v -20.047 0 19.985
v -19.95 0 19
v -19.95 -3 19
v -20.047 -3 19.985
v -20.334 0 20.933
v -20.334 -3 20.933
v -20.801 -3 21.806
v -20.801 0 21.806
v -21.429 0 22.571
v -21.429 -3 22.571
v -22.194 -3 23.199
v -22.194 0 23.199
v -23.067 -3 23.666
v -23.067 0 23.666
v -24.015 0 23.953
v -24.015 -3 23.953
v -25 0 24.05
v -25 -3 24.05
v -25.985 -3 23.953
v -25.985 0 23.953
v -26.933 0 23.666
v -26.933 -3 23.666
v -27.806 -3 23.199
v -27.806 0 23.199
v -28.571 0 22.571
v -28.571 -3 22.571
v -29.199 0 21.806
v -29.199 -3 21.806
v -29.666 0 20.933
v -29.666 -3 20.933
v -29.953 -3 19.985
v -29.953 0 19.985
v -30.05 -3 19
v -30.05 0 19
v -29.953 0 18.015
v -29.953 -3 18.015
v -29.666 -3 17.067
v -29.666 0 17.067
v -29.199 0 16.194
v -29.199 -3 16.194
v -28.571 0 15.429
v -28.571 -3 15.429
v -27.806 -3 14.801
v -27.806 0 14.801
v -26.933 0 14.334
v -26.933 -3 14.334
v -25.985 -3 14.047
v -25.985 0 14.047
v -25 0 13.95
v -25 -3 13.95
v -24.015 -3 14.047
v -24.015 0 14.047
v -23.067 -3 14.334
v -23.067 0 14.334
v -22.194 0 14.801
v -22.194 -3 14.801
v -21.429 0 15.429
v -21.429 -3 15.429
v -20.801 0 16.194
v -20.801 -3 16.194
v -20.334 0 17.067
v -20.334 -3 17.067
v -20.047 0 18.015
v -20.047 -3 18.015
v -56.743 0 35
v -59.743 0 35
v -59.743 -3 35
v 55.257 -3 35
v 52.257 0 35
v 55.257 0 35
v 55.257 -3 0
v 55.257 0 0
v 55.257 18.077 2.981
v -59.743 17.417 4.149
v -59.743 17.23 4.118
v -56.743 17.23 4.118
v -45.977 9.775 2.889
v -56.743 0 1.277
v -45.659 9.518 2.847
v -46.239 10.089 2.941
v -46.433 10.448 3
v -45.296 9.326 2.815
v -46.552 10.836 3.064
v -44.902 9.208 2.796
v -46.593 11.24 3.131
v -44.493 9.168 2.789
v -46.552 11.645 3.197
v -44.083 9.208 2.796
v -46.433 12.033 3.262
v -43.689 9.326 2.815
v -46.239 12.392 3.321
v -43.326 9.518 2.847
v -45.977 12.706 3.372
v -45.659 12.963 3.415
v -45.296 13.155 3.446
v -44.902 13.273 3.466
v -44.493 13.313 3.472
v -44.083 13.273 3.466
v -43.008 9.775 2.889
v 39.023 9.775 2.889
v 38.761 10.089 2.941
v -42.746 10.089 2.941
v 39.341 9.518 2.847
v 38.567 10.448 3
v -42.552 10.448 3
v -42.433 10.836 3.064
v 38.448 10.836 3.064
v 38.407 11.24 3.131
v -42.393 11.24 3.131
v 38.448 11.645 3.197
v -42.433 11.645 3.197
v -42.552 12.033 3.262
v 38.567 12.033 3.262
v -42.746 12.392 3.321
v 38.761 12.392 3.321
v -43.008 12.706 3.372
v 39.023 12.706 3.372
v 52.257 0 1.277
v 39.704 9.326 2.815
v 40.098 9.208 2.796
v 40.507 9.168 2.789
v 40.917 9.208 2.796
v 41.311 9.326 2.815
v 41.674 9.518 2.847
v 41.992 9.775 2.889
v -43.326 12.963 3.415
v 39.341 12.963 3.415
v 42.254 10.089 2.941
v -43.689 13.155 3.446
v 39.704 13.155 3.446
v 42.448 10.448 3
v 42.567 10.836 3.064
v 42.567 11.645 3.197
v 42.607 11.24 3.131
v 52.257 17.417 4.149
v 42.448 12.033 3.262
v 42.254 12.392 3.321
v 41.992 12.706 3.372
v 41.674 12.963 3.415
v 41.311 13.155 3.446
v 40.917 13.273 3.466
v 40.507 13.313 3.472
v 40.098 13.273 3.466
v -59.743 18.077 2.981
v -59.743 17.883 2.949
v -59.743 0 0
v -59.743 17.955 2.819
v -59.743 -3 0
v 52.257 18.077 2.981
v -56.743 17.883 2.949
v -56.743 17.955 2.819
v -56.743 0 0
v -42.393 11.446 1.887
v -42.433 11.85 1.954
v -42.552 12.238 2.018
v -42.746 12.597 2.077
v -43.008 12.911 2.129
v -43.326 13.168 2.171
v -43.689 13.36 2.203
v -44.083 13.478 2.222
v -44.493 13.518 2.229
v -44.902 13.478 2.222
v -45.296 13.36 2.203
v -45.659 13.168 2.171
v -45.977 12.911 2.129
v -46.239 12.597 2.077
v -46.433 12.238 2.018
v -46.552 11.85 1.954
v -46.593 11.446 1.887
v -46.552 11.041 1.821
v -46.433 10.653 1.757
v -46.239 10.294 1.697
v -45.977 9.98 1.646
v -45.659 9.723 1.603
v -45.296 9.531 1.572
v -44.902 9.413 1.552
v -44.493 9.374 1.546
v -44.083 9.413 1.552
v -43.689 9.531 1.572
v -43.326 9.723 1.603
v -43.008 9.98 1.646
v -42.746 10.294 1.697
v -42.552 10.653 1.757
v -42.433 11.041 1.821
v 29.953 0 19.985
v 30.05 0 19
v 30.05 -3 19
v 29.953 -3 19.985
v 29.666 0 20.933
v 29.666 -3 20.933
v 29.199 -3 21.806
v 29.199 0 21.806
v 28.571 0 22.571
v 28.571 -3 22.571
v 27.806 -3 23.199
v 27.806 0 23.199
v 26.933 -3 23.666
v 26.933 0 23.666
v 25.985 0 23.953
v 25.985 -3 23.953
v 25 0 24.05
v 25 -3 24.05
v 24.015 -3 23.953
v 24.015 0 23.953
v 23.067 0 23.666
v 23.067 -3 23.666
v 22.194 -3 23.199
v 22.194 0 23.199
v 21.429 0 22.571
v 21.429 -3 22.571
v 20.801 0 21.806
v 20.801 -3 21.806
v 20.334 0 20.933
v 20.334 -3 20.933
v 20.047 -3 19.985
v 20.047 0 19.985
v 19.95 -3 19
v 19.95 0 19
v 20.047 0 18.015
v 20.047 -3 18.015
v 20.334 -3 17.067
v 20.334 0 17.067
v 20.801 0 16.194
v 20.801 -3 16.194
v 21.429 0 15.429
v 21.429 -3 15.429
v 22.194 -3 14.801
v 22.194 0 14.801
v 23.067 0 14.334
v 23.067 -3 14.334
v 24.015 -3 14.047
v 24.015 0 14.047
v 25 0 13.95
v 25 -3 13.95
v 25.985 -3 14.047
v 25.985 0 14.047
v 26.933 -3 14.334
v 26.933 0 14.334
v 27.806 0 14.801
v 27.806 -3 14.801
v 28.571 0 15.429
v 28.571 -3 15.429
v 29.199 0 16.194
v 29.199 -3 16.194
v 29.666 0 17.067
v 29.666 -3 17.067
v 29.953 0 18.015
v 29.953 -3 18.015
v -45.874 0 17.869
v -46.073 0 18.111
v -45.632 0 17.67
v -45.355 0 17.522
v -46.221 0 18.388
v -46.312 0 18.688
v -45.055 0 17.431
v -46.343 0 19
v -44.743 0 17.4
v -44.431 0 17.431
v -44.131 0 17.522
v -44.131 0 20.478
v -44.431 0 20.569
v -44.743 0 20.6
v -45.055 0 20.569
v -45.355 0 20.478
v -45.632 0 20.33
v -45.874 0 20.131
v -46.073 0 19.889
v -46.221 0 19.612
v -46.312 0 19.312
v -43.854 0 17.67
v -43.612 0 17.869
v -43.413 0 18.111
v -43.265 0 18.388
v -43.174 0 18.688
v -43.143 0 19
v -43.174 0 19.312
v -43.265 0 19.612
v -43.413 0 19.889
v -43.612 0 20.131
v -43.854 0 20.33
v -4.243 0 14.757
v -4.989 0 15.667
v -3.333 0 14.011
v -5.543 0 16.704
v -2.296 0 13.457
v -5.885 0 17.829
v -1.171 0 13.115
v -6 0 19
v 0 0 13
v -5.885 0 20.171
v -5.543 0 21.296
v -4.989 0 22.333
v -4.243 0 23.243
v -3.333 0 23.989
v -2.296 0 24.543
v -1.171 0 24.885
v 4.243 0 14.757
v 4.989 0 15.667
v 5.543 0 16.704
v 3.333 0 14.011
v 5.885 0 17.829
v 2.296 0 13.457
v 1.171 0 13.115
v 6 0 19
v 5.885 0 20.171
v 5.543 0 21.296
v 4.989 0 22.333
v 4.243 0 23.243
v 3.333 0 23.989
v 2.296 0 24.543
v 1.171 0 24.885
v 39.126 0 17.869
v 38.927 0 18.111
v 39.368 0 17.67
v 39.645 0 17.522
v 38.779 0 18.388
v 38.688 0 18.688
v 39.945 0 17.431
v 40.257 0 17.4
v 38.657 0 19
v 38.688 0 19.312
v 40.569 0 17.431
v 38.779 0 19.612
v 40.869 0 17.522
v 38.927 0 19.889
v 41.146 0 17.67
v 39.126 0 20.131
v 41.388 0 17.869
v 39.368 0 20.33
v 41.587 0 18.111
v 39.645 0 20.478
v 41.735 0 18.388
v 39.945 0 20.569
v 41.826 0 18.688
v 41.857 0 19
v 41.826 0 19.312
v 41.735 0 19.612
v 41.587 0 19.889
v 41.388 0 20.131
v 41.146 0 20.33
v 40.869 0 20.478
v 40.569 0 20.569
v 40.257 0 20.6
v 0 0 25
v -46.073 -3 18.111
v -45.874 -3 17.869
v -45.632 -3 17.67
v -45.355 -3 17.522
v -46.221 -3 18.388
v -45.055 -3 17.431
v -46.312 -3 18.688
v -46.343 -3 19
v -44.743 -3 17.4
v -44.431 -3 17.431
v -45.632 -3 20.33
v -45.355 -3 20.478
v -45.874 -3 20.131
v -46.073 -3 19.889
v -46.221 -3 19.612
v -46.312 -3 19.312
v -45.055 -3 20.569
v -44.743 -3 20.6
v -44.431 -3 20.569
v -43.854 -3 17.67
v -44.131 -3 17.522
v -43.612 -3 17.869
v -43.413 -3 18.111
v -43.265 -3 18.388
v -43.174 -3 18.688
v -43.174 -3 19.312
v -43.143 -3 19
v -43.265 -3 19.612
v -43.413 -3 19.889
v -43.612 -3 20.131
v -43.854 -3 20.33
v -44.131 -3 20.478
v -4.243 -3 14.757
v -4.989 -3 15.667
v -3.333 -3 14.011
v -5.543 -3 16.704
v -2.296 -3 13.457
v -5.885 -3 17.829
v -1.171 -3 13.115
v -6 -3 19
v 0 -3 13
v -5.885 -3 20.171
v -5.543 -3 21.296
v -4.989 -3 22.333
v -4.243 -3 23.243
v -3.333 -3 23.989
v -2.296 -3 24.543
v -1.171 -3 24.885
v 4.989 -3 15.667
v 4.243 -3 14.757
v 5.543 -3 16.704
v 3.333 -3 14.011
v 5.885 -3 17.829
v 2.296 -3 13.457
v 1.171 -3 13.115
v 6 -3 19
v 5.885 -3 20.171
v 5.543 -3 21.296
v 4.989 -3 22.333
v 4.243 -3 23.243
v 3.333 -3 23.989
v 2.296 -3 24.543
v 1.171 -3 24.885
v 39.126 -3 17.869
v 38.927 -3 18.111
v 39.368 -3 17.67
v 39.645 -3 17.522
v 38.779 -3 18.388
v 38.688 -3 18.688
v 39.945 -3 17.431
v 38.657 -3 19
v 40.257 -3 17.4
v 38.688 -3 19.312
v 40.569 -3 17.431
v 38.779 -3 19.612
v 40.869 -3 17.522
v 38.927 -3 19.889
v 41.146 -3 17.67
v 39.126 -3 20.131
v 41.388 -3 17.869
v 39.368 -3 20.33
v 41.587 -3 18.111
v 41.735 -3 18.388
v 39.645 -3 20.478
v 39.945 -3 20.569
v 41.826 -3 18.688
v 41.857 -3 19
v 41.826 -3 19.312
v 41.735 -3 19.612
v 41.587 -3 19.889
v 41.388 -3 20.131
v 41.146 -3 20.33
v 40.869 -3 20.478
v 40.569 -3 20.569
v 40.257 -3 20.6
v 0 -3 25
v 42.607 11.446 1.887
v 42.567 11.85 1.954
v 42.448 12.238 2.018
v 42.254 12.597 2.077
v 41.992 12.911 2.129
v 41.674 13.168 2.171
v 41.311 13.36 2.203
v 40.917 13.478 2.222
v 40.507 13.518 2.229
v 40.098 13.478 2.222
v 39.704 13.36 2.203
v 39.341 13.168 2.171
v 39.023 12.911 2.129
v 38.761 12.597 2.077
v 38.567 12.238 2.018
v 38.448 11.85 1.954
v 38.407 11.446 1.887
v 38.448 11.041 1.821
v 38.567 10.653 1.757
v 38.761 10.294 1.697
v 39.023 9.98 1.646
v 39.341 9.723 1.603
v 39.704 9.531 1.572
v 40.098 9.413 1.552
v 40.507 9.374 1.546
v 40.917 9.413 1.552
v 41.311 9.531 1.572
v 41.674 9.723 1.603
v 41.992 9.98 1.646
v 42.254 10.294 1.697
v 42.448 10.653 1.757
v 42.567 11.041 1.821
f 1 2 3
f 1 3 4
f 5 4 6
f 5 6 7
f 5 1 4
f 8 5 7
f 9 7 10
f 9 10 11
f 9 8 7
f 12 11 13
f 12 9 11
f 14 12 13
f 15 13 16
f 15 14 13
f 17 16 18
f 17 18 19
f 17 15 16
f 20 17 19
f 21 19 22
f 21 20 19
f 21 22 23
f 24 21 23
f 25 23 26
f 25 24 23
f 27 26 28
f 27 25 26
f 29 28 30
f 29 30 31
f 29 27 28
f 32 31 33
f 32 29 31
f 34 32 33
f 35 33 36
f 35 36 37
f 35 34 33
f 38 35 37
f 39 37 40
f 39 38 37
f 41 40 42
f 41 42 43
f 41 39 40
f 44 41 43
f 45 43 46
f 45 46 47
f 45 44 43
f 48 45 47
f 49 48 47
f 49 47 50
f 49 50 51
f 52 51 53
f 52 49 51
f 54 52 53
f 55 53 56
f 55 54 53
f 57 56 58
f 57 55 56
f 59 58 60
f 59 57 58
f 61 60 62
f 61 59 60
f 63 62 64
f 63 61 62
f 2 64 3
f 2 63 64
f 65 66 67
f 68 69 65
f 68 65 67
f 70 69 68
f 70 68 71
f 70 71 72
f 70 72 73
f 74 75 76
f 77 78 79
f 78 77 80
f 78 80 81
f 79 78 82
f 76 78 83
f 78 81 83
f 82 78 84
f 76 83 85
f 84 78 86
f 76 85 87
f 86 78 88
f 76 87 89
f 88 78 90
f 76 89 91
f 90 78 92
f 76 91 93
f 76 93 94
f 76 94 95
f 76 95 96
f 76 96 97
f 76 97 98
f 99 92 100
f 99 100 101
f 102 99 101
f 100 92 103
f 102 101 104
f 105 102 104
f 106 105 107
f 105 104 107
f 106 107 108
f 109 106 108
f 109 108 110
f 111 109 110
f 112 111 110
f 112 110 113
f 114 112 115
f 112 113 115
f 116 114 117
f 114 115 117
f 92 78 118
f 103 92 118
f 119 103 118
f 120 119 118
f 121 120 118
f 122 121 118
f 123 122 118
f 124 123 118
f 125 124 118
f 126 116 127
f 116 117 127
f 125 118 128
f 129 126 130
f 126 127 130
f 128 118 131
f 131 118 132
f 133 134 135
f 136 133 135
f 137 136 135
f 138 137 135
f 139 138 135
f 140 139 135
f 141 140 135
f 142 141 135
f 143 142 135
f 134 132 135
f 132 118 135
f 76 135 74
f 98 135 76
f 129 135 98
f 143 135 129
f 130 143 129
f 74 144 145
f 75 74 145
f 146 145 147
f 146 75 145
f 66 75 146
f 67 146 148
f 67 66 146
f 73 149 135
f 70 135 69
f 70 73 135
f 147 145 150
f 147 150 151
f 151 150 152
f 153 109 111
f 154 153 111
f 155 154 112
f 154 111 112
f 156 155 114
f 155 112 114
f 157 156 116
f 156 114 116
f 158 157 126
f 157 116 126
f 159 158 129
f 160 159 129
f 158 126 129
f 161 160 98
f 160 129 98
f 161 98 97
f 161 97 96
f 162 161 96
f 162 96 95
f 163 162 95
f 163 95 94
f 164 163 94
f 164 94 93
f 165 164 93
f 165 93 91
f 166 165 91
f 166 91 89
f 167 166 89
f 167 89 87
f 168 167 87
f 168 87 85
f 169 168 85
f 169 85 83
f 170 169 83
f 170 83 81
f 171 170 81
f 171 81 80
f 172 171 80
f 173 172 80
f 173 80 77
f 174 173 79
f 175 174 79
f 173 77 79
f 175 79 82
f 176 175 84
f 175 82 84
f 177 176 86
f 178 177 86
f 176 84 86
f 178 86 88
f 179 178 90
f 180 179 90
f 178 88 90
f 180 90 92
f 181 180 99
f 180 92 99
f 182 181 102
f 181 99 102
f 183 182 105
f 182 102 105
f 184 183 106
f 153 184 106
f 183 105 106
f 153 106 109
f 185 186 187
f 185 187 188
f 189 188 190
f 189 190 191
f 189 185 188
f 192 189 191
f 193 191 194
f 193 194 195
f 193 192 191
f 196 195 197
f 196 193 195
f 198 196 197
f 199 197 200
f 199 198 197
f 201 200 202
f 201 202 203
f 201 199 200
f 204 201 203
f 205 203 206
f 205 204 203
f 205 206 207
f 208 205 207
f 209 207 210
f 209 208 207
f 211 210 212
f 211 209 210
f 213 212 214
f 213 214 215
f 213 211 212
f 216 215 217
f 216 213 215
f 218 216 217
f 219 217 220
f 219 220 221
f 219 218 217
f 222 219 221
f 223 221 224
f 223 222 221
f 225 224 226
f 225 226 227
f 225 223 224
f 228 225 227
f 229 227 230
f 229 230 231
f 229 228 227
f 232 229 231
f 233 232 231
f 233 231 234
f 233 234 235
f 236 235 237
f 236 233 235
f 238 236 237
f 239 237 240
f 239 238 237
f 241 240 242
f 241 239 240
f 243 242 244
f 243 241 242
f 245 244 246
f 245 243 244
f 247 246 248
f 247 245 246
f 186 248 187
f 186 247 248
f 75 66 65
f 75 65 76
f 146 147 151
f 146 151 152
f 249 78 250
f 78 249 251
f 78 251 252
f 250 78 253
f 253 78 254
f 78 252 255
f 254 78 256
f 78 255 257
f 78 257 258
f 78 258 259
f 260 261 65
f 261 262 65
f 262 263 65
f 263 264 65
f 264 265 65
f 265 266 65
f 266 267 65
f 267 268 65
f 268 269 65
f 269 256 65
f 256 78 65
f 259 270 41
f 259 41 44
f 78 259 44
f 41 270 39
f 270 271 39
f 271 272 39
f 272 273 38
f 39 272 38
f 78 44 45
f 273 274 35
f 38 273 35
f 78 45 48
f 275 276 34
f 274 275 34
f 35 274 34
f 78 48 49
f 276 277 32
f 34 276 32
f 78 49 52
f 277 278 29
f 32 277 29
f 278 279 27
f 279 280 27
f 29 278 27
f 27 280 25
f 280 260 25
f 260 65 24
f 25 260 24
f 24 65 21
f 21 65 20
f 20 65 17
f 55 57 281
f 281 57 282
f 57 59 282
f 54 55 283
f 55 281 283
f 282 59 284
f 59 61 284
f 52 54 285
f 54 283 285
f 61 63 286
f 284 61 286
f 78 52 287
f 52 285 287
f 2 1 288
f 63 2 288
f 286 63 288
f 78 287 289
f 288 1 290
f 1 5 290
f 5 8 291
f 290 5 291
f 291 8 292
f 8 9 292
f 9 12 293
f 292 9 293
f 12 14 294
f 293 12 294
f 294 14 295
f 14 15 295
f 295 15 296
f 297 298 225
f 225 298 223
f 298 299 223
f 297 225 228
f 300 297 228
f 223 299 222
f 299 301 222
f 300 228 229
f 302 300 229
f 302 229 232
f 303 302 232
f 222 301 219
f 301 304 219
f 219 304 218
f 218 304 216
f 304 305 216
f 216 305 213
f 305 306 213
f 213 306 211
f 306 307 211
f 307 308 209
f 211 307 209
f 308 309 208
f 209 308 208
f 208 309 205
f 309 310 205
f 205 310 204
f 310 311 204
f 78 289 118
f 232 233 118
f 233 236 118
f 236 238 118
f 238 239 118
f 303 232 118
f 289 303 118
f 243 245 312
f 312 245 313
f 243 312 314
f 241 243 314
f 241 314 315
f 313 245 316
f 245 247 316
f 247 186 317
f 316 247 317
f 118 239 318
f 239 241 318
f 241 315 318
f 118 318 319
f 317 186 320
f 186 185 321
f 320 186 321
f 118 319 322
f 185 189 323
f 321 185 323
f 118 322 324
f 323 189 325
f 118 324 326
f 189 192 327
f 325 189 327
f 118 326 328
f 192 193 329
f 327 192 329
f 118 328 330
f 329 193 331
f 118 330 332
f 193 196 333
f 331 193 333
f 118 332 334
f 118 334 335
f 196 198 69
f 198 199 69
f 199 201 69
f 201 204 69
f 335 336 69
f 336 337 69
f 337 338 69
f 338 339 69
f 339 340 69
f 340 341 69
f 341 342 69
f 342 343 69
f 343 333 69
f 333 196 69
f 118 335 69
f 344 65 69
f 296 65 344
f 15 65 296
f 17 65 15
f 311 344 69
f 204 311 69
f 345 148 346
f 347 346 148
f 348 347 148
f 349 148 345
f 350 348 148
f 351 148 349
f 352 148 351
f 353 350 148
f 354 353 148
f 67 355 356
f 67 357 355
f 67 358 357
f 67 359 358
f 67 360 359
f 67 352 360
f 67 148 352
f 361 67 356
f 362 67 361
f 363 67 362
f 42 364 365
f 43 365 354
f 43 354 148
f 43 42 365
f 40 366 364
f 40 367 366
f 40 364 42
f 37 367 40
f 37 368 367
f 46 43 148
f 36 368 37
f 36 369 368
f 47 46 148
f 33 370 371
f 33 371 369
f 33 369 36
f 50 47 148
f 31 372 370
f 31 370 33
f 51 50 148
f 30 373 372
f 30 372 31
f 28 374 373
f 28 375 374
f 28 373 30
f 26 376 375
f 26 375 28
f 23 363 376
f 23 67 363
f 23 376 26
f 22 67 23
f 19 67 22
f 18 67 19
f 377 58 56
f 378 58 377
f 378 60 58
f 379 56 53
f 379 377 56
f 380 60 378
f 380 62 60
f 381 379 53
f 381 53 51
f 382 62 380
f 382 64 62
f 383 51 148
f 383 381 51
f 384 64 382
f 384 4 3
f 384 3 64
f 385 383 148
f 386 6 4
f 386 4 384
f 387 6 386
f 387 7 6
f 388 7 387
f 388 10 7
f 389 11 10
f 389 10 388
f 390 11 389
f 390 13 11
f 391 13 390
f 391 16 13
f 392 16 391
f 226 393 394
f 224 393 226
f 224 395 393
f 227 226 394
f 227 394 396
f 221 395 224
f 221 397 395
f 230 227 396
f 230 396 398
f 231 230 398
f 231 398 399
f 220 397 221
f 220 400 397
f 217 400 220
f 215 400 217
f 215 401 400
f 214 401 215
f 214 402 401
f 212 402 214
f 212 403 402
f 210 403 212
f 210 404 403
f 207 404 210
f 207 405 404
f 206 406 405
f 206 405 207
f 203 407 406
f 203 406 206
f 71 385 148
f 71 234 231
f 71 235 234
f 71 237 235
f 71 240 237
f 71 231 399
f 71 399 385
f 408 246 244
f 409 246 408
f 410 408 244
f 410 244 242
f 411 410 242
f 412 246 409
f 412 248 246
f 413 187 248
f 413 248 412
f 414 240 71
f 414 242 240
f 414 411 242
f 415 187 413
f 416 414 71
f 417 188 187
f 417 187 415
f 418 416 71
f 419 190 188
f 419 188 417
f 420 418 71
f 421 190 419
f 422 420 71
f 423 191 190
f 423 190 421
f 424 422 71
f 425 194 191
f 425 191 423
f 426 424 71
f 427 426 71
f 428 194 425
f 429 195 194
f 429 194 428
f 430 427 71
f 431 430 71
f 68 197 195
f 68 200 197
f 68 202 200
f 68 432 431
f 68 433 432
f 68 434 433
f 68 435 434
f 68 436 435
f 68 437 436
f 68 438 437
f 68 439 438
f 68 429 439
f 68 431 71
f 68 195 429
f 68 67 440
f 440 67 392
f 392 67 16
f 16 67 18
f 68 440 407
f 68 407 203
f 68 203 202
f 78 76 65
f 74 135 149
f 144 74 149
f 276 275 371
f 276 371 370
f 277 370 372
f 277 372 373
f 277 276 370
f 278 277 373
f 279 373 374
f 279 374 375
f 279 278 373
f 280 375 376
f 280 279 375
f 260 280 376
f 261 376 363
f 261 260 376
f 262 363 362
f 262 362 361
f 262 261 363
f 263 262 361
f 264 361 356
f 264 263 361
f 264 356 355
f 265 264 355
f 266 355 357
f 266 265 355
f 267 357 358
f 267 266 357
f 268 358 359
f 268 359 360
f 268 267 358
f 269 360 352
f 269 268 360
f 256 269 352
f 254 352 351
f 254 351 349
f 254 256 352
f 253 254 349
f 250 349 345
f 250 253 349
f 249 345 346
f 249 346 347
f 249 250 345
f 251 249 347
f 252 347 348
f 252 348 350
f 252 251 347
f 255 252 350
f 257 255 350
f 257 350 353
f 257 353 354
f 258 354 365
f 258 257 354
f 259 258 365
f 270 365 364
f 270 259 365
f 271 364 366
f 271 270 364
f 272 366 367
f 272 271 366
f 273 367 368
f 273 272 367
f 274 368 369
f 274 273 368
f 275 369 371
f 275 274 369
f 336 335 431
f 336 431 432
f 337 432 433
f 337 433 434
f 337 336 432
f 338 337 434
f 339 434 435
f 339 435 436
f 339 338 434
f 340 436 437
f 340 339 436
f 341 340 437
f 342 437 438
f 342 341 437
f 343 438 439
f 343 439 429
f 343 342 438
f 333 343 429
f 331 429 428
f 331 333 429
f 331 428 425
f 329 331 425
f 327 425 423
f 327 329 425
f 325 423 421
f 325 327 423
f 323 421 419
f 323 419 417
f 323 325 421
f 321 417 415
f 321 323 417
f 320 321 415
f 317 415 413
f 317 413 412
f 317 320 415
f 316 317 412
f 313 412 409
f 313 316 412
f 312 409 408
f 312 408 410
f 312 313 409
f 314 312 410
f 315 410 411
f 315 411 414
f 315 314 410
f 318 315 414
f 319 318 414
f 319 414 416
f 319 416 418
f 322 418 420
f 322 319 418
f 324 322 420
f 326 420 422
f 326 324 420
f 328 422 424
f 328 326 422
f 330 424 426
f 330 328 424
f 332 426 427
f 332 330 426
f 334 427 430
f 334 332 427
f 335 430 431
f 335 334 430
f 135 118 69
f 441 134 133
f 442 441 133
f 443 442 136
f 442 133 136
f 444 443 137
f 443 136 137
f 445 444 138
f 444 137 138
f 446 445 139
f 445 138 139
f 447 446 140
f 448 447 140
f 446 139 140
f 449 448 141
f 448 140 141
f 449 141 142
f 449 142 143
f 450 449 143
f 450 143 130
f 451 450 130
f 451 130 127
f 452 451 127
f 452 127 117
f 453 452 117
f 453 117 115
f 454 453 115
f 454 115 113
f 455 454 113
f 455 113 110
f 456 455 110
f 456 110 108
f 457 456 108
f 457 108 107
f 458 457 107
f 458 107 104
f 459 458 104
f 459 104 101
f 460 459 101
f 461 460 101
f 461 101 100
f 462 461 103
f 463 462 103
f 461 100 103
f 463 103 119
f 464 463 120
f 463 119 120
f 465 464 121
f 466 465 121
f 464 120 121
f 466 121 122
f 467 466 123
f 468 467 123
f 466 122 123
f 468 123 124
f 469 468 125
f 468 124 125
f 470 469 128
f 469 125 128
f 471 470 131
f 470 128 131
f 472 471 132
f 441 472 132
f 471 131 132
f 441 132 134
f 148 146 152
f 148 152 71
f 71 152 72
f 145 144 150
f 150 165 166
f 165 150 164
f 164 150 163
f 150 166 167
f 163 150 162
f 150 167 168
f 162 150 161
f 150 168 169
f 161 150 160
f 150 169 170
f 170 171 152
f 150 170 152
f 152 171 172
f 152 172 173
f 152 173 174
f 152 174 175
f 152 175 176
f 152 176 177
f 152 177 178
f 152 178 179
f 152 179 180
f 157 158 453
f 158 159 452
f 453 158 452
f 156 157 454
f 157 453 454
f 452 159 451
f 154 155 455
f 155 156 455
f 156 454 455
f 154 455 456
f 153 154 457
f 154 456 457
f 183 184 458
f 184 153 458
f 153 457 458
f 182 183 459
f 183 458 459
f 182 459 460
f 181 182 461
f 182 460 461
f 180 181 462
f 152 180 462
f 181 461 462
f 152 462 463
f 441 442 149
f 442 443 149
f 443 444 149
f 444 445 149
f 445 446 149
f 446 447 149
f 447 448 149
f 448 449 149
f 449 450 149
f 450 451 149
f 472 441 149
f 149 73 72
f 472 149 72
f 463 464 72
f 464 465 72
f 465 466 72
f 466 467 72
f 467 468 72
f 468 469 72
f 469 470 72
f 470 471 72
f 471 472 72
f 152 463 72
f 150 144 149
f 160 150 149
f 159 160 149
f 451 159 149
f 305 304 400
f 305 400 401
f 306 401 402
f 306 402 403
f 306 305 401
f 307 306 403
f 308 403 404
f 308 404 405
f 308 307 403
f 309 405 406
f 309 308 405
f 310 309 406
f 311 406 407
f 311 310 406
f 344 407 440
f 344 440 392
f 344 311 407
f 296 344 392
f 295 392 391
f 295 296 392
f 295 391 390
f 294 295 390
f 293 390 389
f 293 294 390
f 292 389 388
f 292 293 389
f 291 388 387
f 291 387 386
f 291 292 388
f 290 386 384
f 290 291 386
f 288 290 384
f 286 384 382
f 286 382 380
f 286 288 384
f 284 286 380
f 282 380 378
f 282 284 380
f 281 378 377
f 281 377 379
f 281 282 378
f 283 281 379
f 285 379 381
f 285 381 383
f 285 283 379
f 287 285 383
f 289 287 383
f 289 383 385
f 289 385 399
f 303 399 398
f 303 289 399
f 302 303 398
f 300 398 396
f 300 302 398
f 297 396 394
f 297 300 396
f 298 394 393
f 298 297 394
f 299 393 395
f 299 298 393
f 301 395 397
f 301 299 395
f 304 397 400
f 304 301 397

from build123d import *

# Parameters (mm, degrees)
F0_W     = 115
F0_H     = 35
F0_R     = 1.6
F0_R_2   = 5.05
F0_R_3   = 6
F1_DEPTH = 3
F3_DEPTH = 3
F5_DEPTH = 3
F7_DEPTH = 112
F8_R     = 2.1
F9_DEPTH = 4.2023227536


with BuildPart() as f1:
    # F0 (on Front) → F1 (new body)
    with BuildSketch(Plane.XZ):
        with Locations((-2.2430759668, 17.5)):
            Rectangle(F0_W, F0_H)
        with Locations((-44.7430759668, 19)):
            Circle(F0_R, mode=Mode.SUBTRACT)
        with Locations((-25, 19)):
            Circle(F0_R_2, mode=Mode.SUBTRACT)
        with Locations((0, 19)):
            Circle(F0_R_3, mode=Mode.SUBTRACT)
        with Locations((25, 19)):
            Circle(F0_R_2, mode=Mode.SUBTRACT)
        with Locations((40.2569240332, 19)):
            Circle(F0_R, mode=Mode.SUBTRACT)
    extrude(amount=F1_DEPTH)

    # F2 (on face) → F3 (join)
    with BuildSketch(Plane(origin=(-59.7430759668, 0, 0), x_dir=(0, -1, 0), z_dir=(-1, 0, 0))):
        Polygon((0, 0), (0, 35), (-17.954993993, 2.8193253092), align=None)
    extrude(amount=-F3_DEPTH)

    # F4 (on face) → F5 (join)
    with BuildSketch(Plane.YZ.offset(55.2569240332)):
        Polygon((18.0769208819, 2.9807693791), (0, 35), (0, 0), align=None)
    extrude(amount=-F5_DEPTH)

    # F6 (on face) → F7 (join)
    with BuildSketch(Plane(origin=(52.2569240332, 0, 0), x_dir=(0, -1, 0), z_dir=(-1, 0, 0))):
        Polygon((-17.4172232201, 4.1492765441), (-18.0769208819, 2.9807693791), (0, 0), (0, 1.2772871172), align=None)
    extrude(amount=F7_DEPTH)

    # F8 (on face) → F9 (cut, through all)
    with BuildSketch(Plane(origin=(0, -0.2050414688, 1.243477082), x_dir=(1, 0, 0), z_dir=(0, -0.1626966256, 0.9866761414))):
        with Locations((40.5074283481, 11.60009671)):
            Circle(F8_R)
        with Locations((-44.4925716519, 11.60009671)):
            Circle(F8_R)
    extrude(amount=-F9_DEPTH, mode=Mode.SUBTRACT)


solid = f1.part
